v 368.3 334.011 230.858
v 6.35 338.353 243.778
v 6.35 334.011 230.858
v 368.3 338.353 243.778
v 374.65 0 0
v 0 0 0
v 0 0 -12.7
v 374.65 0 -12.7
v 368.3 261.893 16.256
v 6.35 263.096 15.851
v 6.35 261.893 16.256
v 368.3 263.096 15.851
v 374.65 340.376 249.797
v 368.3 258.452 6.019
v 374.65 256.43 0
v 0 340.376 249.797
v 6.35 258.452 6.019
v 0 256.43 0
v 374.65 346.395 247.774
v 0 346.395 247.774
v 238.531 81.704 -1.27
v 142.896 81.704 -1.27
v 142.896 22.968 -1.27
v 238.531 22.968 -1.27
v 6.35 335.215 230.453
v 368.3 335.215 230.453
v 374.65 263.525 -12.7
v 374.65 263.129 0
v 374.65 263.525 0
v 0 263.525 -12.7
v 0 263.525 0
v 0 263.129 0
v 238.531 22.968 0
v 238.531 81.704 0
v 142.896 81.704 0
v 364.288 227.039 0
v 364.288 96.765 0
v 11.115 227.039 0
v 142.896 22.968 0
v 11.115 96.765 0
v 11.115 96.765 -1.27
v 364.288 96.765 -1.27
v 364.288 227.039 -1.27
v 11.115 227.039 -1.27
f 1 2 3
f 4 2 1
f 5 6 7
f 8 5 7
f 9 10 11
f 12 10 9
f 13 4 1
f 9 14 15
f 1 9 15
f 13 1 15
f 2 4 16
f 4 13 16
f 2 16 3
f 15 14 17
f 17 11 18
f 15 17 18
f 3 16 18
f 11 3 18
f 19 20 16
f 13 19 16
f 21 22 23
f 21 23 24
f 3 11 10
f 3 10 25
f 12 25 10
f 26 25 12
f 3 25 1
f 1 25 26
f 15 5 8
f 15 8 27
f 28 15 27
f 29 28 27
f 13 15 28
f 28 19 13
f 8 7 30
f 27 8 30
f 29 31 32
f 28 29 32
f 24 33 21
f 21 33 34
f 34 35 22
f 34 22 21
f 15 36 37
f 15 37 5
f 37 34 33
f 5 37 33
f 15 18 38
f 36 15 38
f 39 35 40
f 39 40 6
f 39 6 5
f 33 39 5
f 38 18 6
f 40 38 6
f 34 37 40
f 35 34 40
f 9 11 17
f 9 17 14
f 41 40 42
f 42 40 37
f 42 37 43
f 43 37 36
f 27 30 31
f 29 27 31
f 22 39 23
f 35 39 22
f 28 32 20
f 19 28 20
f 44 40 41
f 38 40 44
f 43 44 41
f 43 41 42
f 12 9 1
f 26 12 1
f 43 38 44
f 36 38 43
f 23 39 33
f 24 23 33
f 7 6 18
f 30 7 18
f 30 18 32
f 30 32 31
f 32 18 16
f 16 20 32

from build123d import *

# Parameters (mm, degrees)
F1_DEPTH = 374.65
F2_W     = 361.95
F2_H     = 250.825
F3_DEPTH = 1.27
F4_W     = 353.1723869964
F4_H     = 130.2746757865
F4_W_2   = 95.635175705
F4_H_2   = 58.7365608662
F5_DEPTH = 1.27
F6_W     = 361.95
F6_H     = 13.6301602835
F6_H_2   = 10.7992181372
F7_DEPTH = 1.27


with BuildPart() as f1:
    # F0 (on Right) → F1 (new body)
    with BuildSketch(Plane.YZ):
        Polygon((256.4296126366, 0), (0, 0), (0, -12.7), (263.525, -12.7), (263.525, 0), (263.1285922031, 0), align=None)
        Polygon((340.3758903778, 249.7968135873), (256.4296126366, 0), (263.1285922031, 0), (346.3950907053, 247.774011714), align=None)
    extrude(amount=F1_DEPTH)

    # F2 (on face) → F3 (cut)
    with BuildSketch(Plane(origin=(0, 230.4084066856, -77.4306438252), x_dir=(1, 0, 0), z_dir=(0, -0.9479055634, 0.3185514761))):
        with Locations((187.325, 213.4485316231)):
            Rectangle(F2_W, F2_H)
    extrude(amount=-F3_DEPTH, mode=Mode.SUBTRACT)

    # F4 (on face) → F5 (cut)
    with BuildSketch(Plane.XY):
        with Locations((187.7015107311, 161.9020588696)):
            Rectangle(F4_W, F4_H)
        with Locations((190.7136440277, 52.3357847705)):
            Rectangle(F4_W_2, F4_H_2)
    extrude(amount=-F5_DEPTH, mode=Mode.SUBTRACT)

    # F6 (on face) → F7 (join, through all)
    with BuildSketch(Plane(origin=(0, 231.6122467511, -77.8352041999), x_dir=(1, 0, 0), z_dir=(0, -0.9479055634, 0.3185514761))):
        with Locations((187.325, 332.0459514814)):
            Rectangle(F6_W, F6_H)
        with Locations((187.325, 93.4356406917)):
            Rectangle(F6_W, F6_H_2)
    extrude(amount=F7_DEPTH)


solid = f1.part
